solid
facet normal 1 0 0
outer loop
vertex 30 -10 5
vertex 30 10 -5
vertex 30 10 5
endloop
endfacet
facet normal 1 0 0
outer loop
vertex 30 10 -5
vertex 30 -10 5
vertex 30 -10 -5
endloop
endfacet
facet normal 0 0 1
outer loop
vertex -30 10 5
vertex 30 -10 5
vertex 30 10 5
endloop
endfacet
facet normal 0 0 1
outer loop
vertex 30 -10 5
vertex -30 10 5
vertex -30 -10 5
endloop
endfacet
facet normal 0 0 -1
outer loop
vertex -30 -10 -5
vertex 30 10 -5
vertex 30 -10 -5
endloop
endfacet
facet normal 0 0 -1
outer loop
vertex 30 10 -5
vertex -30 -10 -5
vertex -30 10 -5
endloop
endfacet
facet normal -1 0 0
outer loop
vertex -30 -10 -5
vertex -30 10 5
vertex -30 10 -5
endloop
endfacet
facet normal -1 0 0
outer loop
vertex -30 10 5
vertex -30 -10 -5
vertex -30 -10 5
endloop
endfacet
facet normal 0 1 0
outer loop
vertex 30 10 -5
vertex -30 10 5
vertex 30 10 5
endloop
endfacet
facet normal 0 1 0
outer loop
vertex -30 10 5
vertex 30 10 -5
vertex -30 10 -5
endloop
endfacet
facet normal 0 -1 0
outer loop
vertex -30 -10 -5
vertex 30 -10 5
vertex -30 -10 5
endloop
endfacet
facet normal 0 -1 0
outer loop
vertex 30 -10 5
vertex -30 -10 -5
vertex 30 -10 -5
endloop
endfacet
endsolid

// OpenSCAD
cube([60,20,10],center = true);
cube([30,20,10],center = true);
